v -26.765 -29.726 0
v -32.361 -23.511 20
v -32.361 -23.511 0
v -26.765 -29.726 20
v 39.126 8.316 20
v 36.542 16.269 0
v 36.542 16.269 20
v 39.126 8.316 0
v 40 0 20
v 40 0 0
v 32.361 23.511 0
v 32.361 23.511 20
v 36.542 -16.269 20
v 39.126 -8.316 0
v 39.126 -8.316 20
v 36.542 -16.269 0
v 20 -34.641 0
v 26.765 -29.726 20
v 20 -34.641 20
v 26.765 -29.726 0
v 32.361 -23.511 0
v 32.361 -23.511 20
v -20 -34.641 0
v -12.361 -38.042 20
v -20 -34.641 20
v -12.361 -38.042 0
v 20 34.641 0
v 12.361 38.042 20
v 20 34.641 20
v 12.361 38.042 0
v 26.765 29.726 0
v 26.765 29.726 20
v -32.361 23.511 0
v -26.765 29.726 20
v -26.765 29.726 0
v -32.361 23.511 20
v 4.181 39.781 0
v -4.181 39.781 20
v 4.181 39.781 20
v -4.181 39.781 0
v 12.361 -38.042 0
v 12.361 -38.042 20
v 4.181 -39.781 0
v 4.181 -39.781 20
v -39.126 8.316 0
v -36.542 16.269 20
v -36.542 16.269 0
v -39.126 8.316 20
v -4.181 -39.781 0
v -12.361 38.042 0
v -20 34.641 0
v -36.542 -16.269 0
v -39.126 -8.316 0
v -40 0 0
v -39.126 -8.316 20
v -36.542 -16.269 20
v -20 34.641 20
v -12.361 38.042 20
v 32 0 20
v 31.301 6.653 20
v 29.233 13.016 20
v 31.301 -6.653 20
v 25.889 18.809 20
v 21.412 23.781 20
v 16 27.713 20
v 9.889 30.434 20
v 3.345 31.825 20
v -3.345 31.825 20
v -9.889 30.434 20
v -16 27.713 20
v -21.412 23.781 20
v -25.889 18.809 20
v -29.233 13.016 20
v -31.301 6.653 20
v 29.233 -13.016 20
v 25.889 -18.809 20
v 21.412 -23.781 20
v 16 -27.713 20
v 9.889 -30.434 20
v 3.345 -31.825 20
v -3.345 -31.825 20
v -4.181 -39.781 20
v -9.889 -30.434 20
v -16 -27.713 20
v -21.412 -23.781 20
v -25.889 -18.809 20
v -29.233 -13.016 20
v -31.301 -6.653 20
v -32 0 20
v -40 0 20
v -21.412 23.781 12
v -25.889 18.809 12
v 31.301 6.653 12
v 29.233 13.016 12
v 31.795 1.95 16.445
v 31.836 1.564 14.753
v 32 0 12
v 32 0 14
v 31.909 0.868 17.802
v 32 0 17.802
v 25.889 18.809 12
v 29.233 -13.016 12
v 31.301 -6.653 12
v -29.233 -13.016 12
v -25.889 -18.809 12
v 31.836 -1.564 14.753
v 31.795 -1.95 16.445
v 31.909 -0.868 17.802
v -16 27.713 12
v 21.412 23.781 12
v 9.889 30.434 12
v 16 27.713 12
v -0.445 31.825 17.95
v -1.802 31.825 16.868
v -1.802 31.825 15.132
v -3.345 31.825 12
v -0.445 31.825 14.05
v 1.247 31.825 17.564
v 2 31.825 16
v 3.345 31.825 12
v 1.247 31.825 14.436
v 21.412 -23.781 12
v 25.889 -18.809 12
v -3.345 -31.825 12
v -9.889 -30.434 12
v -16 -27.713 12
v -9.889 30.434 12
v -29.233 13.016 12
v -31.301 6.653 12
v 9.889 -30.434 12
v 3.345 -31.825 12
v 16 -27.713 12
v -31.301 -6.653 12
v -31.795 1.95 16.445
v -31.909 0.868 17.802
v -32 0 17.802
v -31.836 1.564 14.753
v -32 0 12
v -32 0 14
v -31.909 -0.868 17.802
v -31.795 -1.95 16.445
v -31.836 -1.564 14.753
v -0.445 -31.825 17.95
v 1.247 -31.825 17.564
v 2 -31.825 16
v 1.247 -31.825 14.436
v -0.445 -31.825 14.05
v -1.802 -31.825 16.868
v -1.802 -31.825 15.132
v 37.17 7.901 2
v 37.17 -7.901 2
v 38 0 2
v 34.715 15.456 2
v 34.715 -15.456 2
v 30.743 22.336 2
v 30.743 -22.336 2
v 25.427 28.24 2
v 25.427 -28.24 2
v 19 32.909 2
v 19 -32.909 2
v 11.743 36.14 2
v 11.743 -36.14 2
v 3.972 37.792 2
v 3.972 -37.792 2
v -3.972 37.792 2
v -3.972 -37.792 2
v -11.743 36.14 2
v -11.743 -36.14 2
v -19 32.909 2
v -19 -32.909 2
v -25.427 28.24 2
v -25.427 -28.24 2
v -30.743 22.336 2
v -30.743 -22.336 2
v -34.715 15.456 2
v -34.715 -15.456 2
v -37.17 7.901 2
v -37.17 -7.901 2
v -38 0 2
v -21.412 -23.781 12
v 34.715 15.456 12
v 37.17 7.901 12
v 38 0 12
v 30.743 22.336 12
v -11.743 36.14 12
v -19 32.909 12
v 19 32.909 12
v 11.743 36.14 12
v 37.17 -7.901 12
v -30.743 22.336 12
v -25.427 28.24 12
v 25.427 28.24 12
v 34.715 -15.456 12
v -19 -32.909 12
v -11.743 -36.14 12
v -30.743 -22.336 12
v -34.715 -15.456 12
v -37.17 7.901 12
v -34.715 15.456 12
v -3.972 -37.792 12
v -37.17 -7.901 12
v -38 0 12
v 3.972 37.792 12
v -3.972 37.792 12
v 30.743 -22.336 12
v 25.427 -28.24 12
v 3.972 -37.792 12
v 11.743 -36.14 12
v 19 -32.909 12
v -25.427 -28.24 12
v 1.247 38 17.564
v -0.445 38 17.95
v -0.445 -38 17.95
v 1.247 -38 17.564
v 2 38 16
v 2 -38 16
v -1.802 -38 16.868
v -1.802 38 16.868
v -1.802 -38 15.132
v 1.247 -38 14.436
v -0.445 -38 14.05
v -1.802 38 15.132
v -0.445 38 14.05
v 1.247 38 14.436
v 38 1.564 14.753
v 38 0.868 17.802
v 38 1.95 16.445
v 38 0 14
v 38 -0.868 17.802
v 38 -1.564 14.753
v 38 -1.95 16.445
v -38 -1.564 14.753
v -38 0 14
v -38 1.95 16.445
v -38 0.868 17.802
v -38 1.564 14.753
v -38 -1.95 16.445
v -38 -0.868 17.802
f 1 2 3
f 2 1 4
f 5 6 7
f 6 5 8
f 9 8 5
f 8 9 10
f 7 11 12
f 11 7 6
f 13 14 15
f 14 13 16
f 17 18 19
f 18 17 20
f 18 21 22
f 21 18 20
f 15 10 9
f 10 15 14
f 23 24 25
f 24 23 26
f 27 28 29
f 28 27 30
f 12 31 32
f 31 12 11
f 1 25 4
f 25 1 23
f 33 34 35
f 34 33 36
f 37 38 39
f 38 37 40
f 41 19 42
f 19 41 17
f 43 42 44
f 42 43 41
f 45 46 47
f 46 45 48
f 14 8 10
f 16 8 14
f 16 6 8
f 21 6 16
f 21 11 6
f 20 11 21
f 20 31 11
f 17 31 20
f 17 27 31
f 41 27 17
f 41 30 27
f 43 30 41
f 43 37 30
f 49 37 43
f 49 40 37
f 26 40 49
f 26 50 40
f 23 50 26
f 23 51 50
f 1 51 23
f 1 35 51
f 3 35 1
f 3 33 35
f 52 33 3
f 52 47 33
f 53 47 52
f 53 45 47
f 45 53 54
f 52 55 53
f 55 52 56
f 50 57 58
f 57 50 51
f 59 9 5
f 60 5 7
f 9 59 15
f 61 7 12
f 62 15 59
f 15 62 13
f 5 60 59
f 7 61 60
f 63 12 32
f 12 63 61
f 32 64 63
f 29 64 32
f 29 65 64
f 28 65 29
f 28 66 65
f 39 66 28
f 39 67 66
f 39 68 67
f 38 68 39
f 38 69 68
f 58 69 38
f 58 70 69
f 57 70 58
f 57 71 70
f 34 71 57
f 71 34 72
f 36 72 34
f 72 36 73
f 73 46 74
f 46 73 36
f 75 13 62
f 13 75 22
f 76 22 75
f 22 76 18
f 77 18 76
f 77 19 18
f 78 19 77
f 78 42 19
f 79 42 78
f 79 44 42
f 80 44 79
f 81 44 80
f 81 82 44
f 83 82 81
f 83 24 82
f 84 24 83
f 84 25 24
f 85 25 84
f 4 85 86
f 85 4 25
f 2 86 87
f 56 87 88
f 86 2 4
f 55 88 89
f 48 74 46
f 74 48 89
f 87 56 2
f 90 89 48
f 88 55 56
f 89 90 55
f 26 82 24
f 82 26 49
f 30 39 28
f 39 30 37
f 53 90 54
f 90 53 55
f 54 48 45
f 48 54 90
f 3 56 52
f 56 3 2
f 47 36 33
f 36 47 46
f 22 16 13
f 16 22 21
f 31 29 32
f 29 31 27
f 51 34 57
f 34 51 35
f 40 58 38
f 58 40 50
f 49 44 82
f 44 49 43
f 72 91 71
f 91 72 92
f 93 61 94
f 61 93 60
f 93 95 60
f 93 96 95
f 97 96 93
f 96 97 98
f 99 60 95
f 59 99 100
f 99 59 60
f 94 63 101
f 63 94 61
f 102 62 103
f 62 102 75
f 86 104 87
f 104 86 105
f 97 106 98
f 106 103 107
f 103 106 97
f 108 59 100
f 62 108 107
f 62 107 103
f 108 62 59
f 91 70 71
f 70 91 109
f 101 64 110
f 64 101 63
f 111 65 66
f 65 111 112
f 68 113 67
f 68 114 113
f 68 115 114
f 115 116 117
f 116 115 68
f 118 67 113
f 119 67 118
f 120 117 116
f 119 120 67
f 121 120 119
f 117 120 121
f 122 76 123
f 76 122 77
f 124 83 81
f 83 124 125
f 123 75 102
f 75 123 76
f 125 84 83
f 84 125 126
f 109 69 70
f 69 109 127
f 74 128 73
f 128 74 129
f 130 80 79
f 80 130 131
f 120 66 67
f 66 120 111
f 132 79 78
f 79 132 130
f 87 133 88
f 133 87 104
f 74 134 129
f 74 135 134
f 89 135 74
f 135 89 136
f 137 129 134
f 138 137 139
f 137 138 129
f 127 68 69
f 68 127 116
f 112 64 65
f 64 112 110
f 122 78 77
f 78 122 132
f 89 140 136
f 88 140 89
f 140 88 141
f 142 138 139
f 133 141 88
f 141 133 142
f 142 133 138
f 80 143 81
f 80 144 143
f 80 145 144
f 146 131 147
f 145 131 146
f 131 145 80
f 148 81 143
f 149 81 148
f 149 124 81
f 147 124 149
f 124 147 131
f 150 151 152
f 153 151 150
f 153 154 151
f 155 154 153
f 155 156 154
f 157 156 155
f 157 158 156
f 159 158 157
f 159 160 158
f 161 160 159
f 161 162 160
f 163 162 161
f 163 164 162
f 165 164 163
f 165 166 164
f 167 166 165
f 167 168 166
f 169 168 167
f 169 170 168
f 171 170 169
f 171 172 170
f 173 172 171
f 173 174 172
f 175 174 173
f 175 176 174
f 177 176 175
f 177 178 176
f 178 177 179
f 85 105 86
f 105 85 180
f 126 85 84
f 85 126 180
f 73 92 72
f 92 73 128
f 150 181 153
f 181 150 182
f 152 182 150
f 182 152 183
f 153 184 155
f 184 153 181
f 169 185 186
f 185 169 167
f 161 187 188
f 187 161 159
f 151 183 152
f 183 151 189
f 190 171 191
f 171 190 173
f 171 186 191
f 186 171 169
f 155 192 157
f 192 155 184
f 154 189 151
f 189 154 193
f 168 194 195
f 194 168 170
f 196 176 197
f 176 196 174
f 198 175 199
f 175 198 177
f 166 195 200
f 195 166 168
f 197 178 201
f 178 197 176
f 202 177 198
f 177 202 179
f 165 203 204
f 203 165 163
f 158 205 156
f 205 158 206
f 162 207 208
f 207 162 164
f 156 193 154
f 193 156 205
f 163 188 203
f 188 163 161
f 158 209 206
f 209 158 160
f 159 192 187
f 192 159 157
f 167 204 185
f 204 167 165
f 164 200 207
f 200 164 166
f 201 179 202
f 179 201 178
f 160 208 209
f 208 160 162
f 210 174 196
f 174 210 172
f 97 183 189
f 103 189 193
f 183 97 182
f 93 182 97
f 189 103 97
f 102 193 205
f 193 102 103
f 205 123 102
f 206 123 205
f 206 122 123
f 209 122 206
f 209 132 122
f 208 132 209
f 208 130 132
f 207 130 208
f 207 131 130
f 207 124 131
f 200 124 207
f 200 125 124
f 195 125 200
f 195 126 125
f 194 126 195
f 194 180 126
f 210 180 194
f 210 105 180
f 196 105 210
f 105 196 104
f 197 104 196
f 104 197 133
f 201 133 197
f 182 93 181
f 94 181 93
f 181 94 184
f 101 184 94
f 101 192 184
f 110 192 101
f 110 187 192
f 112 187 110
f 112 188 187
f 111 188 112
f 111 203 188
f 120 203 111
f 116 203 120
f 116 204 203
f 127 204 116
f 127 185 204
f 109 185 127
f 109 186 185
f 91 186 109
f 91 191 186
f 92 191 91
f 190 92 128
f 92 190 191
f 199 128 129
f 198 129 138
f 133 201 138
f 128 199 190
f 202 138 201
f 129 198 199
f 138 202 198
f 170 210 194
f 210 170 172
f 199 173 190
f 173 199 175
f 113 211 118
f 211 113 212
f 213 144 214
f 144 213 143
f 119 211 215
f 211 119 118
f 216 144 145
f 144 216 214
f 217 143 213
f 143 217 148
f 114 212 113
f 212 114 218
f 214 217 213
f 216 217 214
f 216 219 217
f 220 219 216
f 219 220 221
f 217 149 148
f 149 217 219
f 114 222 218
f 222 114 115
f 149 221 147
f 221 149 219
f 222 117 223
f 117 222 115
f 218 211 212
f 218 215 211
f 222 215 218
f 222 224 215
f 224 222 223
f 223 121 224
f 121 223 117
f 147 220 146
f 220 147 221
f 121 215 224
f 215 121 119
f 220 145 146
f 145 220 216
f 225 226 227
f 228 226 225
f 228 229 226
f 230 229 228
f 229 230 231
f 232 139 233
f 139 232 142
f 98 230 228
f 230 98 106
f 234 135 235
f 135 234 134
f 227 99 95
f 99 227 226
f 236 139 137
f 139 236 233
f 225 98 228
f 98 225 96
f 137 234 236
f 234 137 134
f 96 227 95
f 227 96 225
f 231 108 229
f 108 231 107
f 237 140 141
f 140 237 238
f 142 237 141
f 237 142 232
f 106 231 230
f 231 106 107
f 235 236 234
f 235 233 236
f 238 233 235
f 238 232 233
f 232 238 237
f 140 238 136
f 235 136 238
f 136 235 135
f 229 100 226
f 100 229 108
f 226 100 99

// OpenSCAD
// Centrifugal Puzzle Box - Base Model

module cpbBase(radius, width, thickness, clearance){
    difference(){
        // Main Body
        cylinder(h=width, r=radius);
        // Entrance Hole
        translate([0,0,thickness]) 
            cylinder(h=width, r=radius-4*thickness);
        // Container Hole
        translate([0,0,thickness]) 
            cylinder(h=width-5*thickness, r=radius-thickness);
        // Pin Holes
        translate([0,0,width - 2*thickness]) 
            rotate([90,0,0])
                cylinder(h=2*radius-2*thickness, r=thickness, center=true);
        translate([0,0,width - 2*thickness]) 
            rotate([0,90,0])
                cylinder(h=2*radius-2*thickness, r=thickness, center=true);
    }
}




// Main Model
radius = 40;
width = 20;
thickness = 2;

clearance = 0.5;

cpbBase(radius, width, thickness, clearance);
